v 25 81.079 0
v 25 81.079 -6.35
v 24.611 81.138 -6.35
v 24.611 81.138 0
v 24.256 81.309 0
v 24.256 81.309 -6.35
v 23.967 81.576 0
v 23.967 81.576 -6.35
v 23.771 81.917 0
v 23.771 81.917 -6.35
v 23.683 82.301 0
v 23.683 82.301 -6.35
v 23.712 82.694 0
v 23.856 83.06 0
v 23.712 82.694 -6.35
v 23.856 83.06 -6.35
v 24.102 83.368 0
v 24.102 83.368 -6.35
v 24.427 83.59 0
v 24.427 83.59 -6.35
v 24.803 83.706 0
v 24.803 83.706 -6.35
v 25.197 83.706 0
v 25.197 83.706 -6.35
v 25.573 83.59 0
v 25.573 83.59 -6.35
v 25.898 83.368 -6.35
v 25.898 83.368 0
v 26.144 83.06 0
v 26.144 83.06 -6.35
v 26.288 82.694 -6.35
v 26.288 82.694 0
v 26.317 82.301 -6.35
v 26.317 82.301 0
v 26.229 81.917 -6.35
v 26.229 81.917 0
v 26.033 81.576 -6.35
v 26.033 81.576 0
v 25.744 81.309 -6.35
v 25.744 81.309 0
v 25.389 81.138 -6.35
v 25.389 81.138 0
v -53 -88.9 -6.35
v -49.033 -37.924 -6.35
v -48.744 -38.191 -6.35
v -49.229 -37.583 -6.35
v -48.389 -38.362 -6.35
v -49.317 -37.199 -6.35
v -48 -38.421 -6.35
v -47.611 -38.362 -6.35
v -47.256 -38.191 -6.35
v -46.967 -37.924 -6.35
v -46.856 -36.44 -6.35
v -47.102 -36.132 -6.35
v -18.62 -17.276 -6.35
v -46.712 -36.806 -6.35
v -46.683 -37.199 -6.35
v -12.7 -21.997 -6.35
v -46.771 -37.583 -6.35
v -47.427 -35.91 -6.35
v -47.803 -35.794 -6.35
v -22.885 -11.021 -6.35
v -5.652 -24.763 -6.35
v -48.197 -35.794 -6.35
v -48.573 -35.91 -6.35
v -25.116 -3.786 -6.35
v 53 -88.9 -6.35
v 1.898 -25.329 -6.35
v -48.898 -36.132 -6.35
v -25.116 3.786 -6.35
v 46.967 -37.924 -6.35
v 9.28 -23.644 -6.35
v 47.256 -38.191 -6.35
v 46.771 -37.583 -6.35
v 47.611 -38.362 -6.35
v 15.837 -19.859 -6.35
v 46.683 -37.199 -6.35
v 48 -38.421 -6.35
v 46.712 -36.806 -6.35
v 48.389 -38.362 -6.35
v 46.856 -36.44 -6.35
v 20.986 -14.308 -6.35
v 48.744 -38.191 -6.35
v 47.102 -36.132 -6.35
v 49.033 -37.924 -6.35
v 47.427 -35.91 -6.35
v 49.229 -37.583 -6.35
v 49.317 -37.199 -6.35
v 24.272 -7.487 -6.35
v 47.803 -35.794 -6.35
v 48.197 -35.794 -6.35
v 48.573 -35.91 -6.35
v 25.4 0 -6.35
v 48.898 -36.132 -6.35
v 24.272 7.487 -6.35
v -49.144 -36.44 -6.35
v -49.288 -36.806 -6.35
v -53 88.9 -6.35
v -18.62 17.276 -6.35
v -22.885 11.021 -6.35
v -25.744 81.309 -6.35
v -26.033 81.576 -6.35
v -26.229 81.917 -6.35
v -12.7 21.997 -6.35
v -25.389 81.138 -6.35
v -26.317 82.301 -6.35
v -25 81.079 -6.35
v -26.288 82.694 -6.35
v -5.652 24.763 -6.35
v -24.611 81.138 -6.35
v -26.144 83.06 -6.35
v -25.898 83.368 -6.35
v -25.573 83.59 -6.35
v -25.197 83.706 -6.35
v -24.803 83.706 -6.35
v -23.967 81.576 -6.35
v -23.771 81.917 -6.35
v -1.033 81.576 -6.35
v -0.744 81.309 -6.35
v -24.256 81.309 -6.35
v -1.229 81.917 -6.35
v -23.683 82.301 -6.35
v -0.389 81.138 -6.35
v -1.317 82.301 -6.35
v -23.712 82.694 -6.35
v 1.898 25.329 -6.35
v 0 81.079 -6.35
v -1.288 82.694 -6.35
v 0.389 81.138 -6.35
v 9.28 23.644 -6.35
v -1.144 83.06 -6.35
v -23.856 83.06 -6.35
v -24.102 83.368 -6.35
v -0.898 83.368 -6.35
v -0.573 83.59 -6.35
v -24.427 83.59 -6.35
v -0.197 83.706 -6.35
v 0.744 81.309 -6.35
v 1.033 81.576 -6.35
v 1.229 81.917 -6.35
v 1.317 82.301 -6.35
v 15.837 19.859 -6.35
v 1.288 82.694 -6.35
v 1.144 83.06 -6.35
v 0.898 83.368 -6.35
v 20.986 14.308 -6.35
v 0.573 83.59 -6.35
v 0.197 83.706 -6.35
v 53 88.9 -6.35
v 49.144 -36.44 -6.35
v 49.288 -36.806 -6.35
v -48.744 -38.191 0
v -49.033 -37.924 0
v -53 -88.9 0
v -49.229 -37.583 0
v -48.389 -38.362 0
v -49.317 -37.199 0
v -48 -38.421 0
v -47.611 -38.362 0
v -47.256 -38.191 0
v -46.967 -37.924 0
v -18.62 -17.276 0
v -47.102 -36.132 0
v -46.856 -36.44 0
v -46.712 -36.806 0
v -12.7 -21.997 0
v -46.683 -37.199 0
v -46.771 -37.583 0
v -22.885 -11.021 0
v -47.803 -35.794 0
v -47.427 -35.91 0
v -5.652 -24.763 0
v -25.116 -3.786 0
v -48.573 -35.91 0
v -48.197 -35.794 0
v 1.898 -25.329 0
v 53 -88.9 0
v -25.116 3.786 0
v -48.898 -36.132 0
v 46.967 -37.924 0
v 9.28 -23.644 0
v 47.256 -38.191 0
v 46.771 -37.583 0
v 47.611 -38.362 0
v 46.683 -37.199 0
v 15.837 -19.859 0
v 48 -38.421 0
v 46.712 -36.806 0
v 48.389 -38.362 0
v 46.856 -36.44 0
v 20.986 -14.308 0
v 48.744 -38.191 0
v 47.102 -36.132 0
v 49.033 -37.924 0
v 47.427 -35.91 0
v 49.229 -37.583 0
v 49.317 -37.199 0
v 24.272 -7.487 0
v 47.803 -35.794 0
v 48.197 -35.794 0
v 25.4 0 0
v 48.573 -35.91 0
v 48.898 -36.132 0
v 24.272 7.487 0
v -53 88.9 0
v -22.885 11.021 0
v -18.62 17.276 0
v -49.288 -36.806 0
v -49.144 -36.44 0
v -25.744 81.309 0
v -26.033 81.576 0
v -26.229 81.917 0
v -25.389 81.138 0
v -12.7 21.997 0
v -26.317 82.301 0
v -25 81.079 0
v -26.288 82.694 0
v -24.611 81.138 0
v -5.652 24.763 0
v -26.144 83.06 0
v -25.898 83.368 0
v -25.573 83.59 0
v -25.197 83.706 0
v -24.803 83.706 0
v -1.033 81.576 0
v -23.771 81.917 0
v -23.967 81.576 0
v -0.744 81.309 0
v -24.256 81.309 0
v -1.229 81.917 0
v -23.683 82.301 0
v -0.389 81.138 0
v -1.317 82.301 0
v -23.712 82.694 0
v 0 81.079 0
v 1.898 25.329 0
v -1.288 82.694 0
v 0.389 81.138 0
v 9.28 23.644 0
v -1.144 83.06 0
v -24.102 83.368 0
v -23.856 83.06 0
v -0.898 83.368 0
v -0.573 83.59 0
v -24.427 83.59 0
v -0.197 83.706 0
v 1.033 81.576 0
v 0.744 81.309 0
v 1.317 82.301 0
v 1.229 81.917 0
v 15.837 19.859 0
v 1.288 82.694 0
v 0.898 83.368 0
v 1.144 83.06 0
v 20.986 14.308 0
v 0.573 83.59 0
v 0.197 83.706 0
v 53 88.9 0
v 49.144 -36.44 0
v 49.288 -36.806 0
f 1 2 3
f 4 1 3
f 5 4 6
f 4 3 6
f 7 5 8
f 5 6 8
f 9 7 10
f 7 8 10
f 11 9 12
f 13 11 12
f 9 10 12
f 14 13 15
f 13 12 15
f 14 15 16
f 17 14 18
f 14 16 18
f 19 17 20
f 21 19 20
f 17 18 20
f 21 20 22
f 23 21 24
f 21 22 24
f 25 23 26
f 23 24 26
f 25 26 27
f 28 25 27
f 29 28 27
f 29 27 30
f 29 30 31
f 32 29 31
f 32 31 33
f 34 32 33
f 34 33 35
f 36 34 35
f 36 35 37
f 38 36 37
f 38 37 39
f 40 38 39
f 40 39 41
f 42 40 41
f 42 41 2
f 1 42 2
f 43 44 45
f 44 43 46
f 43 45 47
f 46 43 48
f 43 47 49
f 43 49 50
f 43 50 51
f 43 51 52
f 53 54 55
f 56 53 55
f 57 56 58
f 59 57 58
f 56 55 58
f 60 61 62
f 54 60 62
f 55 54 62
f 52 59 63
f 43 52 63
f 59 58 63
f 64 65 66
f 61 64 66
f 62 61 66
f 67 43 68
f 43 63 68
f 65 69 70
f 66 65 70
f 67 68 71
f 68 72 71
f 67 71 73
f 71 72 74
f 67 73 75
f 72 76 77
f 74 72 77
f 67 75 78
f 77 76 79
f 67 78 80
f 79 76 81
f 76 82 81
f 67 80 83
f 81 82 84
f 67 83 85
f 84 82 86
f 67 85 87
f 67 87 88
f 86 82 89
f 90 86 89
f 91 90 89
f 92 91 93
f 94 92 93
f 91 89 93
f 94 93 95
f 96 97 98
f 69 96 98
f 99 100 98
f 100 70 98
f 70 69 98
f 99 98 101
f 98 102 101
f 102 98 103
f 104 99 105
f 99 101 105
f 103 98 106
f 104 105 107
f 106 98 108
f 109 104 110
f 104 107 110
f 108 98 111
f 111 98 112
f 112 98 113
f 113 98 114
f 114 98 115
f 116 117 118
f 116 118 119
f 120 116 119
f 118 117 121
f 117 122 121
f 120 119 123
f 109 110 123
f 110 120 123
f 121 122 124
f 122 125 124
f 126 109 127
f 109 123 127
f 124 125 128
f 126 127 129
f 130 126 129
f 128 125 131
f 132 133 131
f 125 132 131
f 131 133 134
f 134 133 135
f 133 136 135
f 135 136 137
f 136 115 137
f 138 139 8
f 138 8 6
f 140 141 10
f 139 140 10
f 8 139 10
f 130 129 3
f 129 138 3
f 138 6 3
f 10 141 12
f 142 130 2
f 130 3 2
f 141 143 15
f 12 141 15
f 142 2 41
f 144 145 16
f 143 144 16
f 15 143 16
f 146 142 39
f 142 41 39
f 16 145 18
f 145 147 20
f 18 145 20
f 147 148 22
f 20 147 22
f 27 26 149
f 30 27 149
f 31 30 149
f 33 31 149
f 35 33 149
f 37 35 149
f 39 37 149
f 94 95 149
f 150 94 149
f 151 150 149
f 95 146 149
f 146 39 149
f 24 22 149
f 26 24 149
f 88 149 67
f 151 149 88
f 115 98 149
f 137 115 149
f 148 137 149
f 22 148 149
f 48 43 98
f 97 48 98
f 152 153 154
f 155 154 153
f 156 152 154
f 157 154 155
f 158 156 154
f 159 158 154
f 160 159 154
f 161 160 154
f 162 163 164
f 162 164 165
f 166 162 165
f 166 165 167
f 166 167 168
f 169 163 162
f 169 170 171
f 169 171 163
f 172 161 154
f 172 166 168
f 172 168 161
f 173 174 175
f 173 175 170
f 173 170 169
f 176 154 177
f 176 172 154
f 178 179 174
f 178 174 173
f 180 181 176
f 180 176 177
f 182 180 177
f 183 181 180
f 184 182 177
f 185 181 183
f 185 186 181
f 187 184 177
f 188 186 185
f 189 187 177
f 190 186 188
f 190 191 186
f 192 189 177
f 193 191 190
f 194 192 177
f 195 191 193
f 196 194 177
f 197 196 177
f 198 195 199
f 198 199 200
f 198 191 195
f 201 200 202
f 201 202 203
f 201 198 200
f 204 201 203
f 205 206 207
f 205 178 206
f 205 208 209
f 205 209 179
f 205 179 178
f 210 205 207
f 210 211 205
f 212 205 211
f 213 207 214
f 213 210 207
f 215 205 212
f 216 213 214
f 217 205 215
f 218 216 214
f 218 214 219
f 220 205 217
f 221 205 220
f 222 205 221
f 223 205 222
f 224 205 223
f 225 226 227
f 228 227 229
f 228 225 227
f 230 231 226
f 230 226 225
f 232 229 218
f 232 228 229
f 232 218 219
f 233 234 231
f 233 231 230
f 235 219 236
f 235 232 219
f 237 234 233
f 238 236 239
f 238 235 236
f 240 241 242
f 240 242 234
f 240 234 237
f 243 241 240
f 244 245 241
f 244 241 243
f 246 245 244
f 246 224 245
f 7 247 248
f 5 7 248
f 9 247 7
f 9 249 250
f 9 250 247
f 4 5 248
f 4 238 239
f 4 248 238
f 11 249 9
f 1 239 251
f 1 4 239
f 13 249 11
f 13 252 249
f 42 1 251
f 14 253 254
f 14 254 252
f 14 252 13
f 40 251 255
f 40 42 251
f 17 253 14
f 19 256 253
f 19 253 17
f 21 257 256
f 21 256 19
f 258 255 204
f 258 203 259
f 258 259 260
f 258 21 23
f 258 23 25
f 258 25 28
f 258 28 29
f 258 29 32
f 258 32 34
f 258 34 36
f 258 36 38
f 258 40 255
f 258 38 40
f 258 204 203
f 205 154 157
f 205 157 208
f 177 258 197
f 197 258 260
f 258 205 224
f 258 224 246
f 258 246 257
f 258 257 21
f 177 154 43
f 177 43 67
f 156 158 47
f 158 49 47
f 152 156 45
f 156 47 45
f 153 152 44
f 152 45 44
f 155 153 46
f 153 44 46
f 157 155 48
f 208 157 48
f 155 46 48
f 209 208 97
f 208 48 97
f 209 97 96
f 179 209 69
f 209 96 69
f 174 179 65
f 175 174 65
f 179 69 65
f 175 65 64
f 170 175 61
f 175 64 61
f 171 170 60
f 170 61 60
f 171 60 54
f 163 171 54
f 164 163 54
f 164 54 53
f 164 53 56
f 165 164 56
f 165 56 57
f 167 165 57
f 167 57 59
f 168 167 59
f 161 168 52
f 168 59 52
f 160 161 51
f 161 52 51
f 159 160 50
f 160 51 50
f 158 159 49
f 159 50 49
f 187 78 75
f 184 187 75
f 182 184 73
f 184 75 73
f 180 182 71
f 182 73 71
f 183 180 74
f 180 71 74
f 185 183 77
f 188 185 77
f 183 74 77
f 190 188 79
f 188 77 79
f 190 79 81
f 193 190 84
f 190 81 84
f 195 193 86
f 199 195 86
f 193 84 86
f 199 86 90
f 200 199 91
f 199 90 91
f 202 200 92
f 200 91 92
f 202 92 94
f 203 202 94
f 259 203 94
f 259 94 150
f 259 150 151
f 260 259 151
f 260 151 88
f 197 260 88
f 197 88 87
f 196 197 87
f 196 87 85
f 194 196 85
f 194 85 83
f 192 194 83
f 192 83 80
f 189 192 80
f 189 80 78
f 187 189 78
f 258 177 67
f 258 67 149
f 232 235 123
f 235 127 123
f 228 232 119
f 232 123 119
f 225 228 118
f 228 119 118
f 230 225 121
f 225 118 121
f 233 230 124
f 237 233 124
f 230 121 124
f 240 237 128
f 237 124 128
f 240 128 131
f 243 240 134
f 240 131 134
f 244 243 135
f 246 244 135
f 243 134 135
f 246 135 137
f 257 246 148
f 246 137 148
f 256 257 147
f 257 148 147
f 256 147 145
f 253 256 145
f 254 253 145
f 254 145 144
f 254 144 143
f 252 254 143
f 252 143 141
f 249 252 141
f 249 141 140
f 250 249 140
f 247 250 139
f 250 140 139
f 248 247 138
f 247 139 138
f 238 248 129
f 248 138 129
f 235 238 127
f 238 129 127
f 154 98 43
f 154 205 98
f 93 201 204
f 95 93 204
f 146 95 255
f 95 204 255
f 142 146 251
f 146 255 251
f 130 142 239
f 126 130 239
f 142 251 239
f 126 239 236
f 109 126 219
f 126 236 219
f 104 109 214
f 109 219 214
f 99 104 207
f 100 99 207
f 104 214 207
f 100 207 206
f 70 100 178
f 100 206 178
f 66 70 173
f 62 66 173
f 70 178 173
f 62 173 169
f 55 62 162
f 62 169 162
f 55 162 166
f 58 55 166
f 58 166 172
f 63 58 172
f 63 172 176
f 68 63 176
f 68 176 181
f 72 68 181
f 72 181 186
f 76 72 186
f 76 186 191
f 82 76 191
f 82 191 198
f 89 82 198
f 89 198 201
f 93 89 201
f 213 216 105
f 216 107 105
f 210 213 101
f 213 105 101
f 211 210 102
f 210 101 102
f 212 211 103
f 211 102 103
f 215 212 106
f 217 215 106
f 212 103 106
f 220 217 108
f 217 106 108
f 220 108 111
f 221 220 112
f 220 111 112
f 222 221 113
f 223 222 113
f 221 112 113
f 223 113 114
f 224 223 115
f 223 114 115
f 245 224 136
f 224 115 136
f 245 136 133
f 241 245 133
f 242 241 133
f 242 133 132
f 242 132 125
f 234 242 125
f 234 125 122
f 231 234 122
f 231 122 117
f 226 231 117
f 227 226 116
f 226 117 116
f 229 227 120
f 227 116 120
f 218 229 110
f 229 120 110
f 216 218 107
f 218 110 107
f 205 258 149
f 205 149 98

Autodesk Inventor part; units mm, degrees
ref_plane "YZ Plane" through (0, 0, 0) normal (1, 0, 0) x (0, 1, 0)
ref_plane "XZ Plane" through (0, 0, 0) normal (0, 1, 0) x (-1, 0, 0)
ref_plane "XY Plane" through (0, 0, 0) normal (0, 0, 1) x (1, 0, 0)
sketch "Sketch2" plane through (0, 0, 0) normal (0, 0, 1) x (1, 0, 0)
  line L0 (-53, -88.9) -> (53, -88.9)
  line L1 (53, -88.9) -> (53, 88.9)
  line L2 (53, 88.9) -> (-53, 88.9)
  line L3 (-53, 88.9) -> (-53, -88.9)
  line L4 (-53, -88.9) -> (53, 88.9) construction
  line L5 (53, -88.9) -> (-53, 88.9) construction
  point P0 (0, 0)
  dimension "d0" = 106
  dimension "d1" = 177.8
extrude "Extrusion1" add sketch "Sketch2" against normal blind 6.35
sketch "Sketch5" plane through (0, 0, 0) normal (0, 0, 1) x (1, 0, 0)
  circle A0 centre (0, 0) radius 25.4
  dimension "d26" = 50.8
extrude "CenterHole" cut sketch "Sketch5" against normal through all
sketch "Sketch6" plane through (0, 0, 0) normal (0, 0, 1) x (1, 0, 0)
  line L0 (-53, 88.9) -> (-53, -88.9) projected
  line L1 (53, -88.9) -> (53, 88.9) projected
  line L2 (-53, -88.9) -> (-53, 88.9) construction
  line L3 (-53, 82.4) -> (53, 82.4) construction
  line L4 (53, 88.9) -> (-53, 88.9) construction
  point P0 (0, 0)
  point P1 (0, 82.4)
  point P2 (123.3454, 23.3667)
  point P3 (-25, 82.4)
  point P4 (25, 82.4)
  dimension "d29" = 6.5
  dimension "d30" = 25
  dimension "d31" = 25
hole "TopThreeHoles" at (0, 82.4, 0) at (123.3454, 23.3667, 0) at (-25, 82.4, 0) at (25, 82.4, 0) direction (0, 0, -1) diameter 2.6416 end through all thread size "6-32 UNC" class "2B" standard "ANSI Unified Screw Threads"
sketch "Sketch7" plane through (0, 0, 0) normal (0, 0, 1) x (1, 0, 0)
  line L0 (53, -88.9) -> (53, 88.9) projected
  line L1 (-53, 88.9) -> (-53, -88.9) projected
  line L2 (-53, -37.1) -> (53, -37.1) construction
  line L3 (53, 88.9) -> (53, -88.9) projected
  line L4 (53, 88.9) -> (-53, 88.9) construction
  point P0 (0, 0)
  point P1 (-48, -37.1)
  point P2 (48, -37.1)
  dimension "d39" = 126
  dimension "d40" = 5
  dimension "d41" = 5
hole "Hole3" at (-48, -37.1, 0) at (48, -37.1, 0) direction (0, 0, -1) diameter 2.6416 end through all thread size "6-32 UNC" class "2B" standard "ANSI Unified Screw Threads"
properties part number "gateGasket"
